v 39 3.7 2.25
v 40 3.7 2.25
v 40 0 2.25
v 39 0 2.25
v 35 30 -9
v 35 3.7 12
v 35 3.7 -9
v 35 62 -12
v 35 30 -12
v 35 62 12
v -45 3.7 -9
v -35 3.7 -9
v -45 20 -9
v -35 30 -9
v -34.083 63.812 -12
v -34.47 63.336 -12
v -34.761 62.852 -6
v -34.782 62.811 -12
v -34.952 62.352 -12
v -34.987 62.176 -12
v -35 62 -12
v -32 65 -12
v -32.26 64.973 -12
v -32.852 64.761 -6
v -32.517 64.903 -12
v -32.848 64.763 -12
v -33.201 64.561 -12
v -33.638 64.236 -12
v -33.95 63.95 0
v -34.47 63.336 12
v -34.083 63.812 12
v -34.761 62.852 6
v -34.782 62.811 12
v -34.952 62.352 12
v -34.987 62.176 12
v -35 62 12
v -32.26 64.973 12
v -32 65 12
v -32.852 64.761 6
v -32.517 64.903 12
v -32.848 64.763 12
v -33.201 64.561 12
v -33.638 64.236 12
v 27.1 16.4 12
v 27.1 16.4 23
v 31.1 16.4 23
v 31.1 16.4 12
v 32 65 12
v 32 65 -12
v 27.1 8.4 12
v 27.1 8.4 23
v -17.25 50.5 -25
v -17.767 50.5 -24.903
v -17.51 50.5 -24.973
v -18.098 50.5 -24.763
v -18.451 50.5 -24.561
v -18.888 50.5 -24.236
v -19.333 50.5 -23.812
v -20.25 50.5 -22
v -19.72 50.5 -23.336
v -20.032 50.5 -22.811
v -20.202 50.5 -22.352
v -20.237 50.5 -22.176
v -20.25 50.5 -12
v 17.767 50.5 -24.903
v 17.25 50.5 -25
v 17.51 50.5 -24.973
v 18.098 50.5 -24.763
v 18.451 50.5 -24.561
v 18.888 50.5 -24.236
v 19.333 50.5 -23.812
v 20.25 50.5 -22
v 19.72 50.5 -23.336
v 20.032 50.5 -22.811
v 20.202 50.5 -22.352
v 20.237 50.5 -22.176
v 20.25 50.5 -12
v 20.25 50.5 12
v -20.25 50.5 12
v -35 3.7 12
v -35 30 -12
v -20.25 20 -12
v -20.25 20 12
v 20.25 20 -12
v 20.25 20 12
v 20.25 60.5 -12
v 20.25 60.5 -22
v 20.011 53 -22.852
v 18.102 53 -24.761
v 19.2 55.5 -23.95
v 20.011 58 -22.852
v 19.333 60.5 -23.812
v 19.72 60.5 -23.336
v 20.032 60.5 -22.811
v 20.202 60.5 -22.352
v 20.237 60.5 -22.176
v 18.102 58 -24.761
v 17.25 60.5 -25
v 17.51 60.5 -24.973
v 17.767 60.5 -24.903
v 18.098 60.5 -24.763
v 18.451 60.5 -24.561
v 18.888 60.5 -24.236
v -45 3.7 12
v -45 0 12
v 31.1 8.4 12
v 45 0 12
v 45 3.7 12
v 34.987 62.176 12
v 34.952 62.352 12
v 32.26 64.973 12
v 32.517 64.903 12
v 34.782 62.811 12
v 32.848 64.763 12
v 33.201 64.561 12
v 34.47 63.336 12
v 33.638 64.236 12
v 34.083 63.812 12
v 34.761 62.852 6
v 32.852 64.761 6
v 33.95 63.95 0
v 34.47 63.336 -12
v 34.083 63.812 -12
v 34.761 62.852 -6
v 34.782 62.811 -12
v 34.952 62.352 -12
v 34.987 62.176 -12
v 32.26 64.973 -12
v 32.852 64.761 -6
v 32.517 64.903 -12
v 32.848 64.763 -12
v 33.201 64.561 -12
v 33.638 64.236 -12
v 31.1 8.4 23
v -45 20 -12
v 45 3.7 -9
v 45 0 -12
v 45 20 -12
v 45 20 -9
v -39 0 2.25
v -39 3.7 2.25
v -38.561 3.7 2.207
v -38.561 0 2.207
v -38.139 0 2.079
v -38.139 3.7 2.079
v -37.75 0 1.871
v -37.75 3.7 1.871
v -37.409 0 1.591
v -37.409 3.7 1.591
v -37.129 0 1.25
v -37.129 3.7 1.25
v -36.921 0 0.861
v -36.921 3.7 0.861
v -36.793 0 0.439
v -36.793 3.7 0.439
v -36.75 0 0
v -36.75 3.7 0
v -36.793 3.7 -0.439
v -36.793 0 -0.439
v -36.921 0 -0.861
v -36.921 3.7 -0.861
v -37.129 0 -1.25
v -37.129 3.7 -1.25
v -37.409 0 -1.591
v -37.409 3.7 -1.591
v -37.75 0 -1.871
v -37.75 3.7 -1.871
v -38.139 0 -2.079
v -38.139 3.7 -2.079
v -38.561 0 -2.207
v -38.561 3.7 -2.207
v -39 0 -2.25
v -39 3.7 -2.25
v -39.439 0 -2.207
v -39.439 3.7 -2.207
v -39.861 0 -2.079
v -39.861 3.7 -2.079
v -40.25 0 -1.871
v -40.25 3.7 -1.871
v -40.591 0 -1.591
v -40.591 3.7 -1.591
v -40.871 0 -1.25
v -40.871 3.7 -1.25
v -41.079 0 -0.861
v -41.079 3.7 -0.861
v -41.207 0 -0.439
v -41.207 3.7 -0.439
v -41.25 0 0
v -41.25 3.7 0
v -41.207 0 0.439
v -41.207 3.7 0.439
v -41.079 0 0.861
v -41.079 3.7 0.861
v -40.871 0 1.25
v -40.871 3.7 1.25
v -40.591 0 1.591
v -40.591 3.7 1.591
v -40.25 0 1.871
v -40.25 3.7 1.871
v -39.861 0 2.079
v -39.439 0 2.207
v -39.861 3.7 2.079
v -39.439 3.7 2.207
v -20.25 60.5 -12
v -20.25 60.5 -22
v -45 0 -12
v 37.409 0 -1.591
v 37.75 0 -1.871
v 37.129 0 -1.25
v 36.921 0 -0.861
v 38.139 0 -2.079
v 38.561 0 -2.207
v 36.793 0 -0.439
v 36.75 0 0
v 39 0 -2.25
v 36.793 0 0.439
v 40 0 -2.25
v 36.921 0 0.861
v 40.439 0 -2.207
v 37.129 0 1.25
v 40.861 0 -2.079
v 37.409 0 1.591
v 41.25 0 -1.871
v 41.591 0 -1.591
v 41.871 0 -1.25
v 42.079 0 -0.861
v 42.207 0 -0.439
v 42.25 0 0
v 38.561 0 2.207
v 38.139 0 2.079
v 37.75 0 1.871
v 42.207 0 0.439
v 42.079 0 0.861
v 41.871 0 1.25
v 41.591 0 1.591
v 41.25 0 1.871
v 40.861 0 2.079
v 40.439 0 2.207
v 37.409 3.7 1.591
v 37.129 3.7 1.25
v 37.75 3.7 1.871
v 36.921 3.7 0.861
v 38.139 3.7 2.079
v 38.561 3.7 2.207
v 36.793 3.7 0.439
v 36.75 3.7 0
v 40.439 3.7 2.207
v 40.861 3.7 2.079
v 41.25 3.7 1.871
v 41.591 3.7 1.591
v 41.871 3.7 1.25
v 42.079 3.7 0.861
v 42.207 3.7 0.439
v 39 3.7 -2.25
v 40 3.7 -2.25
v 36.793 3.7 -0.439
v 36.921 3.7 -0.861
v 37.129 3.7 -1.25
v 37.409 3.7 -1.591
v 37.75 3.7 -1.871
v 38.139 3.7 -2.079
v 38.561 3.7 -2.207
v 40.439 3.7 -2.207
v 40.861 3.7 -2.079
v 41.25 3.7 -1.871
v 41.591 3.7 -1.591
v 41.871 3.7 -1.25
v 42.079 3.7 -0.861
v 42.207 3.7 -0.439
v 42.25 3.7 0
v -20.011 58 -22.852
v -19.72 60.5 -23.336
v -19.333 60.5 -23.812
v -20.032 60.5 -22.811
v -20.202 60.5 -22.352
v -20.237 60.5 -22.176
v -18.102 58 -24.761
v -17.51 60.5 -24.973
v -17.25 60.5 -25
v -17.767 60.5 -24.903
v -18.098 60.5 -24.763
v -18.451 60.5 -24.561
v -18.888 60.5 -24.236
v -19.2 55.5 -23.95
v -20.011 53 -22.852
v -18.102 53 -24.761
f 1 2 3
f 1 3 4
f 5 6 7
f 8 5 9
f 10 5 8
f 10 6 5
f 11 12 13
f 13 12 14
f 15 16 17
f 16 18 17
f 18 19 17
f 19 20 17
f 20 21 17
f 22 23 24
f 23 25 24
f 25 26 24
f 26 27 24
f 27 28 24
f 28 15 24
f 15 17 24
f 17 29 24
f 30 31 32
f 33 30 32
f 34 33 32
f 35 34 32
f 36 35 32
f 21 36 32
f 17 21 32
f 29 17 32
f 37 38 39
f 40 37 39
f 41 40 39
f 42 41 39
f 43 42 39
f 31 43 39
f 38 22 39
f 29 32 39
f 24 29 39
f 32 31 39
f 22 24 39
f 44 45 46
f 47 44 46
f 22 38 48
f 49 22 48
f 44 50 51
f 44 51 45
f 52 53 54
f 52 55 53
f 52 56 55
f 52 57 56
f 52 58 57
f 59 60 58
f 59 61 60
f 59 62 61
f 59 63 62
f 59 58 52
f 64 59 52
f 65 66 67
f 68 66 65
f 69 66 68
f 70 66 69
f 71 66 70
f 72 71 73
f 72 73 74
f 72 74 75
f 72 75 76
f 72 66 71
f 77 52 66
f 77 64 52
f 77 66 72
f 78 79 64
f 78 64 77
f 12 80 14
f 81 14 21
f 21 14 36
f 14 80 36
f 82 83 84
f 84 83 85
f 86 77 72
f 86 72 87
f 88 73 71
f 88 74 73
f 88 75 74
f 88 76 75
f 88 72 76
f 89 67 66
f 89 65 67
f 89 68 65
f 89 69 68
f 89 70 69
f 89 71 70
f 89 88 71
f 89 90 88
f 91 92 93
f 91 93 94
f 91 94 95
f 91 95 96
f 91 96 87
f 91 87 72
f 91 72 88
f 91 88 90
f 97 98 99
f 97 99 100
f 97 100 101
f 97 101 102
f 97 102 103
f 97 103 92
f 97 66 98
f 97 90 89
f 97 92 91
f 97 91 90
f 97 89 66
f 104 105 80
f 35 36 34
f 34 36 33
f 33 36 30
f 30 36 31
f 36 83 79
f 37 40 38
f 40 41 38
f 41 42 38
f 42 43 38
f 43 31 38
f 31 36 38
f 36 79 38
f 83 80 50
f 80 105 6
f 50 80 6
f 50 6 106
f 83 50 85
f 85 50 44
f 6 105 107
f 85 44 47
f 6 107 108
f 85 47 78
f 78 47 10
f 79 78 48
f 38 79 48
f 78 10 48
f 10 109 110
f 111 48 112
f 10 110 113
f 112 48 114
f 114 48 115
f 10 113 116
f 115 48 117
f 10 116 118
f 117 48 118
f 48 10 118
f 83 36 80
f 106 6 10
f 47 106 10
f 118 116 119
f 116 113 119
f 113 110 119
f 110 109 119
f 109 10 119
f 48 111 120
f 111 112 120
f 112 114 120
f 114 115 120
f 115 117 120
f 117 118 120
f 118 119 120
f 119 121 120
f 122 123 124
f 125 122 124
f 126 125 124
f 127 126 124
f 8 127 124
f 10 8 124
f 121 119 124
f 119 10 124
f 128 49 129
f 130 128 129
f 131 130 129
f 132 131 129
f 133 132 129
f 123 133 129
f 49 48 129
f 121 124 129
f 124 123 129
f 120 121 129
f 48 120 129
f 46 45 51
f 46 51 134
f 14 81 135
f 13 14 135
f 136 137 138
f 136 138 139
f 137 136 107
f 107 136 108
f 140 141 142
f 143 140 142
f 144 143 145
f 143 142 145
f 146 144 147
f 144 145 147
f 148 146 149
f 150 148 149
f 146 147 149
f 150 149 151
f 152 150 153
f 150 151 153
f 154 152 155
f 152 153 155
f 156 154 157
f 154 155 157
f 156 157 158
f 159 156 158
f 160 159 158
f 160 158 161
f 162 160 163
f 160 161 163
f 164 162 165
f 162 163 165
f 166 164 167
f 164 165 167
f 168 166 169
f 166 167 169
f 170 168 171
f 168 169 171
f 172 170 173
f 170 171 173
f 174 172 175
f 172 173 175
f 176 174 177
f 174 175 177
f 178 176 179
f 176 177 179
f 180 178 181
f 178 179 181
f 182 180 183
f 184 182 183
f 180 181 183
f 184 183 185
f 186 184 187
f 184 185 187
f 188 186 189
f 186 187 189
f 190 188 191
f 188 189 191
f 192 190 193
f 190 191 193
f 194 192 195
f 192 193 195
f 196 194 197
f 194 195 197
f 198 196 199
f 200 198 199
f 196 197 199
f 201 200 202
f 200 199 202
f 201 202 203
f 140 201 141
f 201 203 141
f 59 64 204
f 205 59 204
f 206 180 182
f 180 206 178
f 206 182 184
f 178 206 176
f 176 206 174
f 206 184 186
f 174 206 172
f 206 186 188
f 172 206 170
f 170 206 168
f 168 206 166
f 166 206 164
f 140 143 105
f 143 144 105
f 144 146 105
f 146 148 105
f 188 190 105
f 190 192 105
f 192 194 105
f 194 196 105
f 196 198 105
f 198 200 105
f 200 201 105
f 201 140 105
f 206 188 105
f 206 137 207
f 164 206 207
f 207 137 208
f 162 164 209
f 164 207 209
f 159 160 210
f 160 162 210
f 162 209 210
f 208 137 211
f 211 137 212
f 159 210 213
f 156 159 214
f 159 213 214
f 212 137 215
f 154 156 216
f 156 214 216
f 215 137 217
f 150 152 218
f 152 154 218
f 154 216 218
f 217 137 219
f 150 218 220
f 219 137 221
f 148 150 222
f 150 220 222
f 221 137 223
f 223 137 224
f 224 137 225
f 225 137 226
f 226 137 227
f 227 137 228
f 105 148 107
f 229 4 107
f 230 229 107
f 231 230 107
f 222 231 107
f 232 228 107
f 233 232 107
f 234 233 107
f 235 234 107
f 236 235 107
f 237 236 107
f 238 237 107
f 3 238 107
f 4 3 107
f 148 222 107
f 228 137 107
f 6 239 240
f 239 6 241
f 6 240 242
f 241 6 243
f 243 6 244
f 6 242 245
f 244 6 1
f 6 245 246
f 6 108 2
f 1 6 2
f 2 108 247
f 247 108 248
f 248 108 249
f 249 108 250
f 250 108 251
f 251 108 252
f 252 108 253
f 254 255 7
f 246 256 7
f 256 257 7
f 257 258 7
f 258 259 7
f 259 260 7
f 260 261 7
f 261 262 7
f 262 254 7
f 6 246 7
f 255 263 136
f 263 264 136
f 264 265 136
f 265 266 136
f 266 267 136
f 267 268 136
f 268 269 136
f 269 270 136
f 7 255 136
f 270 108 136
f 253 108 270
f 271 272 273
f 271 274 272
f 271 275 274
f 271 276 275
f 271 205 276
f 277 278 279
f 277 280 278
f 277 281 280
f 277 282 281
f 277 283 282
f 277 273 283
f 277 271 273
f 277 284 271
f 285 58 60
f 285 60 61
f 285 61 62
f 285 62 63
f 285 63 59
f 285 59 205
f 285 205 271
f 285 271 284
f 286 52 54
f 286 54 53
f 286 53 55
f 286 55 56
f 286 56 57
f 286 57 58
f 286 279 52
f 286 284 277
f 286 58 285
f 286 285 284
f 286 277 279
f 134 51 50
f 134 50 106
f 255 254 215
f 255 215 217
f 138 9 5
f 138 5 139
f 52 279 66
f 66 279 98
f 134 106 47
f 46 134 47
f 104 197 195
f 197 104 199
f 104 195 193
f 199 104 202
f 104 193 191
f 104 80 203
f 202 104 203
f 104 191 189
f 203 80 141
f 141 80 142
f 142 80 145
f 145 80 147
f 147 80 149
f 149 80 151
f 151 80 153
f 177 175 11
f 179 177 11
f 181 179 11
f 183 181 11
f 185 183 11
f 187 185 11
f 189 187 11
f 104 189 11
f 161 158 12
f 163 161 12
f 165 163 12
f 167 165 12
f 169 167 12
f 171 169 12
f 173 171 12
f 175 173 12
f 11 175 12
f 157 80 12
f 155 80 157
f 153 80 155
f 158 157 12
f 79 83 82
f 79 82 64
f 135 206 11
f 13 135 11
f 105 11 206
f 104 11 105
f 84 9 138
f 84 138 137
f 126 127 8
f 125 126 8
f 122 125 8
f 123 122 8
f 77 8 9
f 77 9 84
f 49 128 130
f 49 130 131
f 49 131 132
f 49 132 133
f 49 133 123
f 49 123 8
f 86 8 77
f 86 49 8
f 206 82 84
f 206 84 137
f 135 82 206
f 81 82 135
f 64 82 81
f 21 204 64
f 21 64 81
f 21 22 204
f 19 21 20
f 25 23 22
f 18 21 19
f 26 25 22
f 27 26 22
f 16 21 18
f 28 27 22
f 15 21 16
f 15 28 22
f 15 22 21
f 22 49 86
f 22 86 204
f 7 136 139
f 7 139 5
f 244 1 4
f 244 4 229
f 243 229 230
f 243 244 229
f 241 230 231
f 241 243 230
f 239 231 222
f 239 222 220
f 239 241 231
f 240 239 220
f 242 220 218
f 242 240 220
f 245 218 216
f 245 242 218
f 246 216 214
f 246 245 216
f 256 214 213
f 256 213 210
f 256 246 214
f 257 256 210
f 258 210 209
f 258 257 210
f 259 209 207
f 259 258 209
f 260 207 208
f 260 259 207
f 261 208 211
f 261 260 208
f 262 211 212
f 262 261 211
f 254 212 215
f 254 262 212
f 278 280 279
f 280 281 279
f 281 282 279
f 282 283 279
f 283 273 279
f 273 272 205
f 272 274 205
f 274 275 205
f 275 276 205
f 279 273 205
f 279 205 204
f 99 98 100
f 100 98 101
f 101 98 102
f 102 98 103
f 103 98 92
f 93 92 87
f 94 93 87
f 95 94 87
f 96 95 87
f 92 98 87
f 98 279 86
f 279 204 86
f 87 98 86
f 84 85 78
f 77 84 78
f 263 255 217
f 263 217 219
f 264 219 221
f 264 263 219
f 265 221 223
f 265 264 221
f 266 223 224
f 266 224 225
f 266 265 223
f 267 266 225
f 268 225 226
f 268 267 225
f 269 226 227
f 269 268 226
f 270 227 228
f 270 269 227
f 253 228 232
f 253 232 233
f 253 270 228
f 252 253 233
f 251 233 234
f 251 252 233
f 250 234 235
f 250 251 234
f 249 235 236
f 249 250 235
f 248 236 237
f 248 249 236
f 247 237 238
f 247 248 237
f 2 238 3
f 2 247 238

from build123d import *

# Parameters (mm, degrees)
SKETCH1_W           = 70
SKETCH1_H           = 65
BOSS_EXTRUDE1_DEPTH = 12
BOSS_EXTRUDE2_START = 10
BOSS_EXTRUDE2_DEPTH = 90
BOSS_EXTRUDE3_DEPTH = 3
SKETCH4_W           = 40.5
SKETCH4_H           = 10
BOSS_EXTRUDE4_DEPTH = 13
SKETCH5_W           = 40.5
SKETCH5_H           = 30.5
CUT_EXTRUDE1_DEPTH  = 24
SKETCH6_W           = 4
SKETCH6_H           = 8
BOSS_EXTRUDE5_DEPTH = 11
FILLET1_SIZE        = 3
SKETCH7_R           = 2.25
CUT_EXTRUDE2_DEPTH  = 3.7


with BuildPart() as part:
    # Sketch1 → Boss-Extrude1 (new, symmetric)
    with BuildSketch(Plane.XY):
        with Locations((0, 32.5)):
            Rectangle(SKETCH1_W, SKETCH1_H)
    extrude(amount=BOSS_EXTRUDE1_DEPTH, both=True)

    # Sketch2 → Boss-Extrude2 (add)
    with BuildSketch(Plane(origin=(35, 0, 0), x_dir=(0, 0, -1), z_dir=(1, 0, 0)).offset(BOSS_EXTRUDE2_START)):
        Polygon((12, 20), (12, 0), (-12, 0), (-12, 3.7), (9, 3.7), (9, 20), align=None)
    extrude(amount=-BOSS_EXTRUDE2_DEPTH)

    # Sketch3 → Boss-Extrude3 (add)
    with BuildSketch(Plane(origin=(0, 0, -12), x_dir=(-1, 0, 0), z_dir=(0, 0, -1))):
        Polygon((-45, 20), (-35, 20), (-35, 30), align=None)
        Polygon((35, 30), (45, 20), (35, 20), align=None)
    extrude(amount=-BOSS_EXTRUDE3_DEPTH)

    # Sketch4 → Boss-Extrude4 (add)
    with BuildSketch(Plane.XY.offset(-12)):
        with Locations((0, 55.5)):
            Rectangle(SKETCH4_W, SKETCH4_H)
    extrude(amount=-BOSS_EXTRUDE4_DEPTH)

    # Sketch5 → Cut-Extrude1 (cut)
    with BuildSketch(Plane.XY.offset(12)):
        with Locations((0, 35.25)):
            Rectangle(SKETCH5_W, SKETCH5_H)
    extrude(amount=-CUT_EXTRUDE1_DEPTH, mode=Mode.SUBTRACT)

    # Sketch6 → Boss-Extrude5 (add)
    with BuildSketch(Plane.XY.offset(12)):
        with Locations((29.1, 12.4)):
            Rectangle(SKETCH6_W, SKETCH6_H)
    extrude(amount=BOSS_EXTRUDE5_DEPTH)

    # Fillet1
    # a fillet whose section is not a circle: 3 mm, written as the material it takes off along each edge
    with BuildSketch(Plane(origin=(-35, 65, 19.5), x_dir=(0, -1, 0), z_dir=(0, 0, -1)), Plane(origin=(35, 65, -19.5), x_dir=(0, -1, 0), z_dir=(0, 0, 1))) as fillet1_piece_1:
        with BuildLine():
            Bezier((FILLET1_SIZE, 0), (0, 0), (0, -FILLET1_SIZE), weights=[1, 0.428571429, 1])
            Line((0, -FILLET1_SIZE), (0, 0))
            Line((0, 0), (FILLET1_SIZE, 0))
        make_face()
    extrude(amount=39, mode=Mode.SUBTRACT)
    with BuildSketch(Plane(origin=(-20.25, 43, -25), x_dir=(0, 0, 1), z_dir=(0, 1, 0)), Plane(origin=(20.25, 68, -25), x_dir=(0, 0, 1), z_dir=(0, -1, 0))) as fillet1_piece_2:
        with BuildLine():
            Bezier((FILLET1_SIZE, 0), (0, 0), (0, FILLET1_SIZE), weights=[1, 0.428571429, 1])
            Line((0, FILLET1_SIZE), (0, 0))
            Line((0, 0), (FILLET1_SIZE, 0))
        make_face()
    extrude(amount=25, mode=Mode.SUBTRACT)

    # Sketch7 → Cut-Extrude2 (cut)
    with BuildSketch(Plane(origin=(0, 3.7, 0), x_dir=(1, 0, 0), z_dir=(0, 1, 0))):
        with Locations(Location((-39, 0, 0), (0, 0, 270))):
            Circle(SKETCH7_R)
        with BuildLine():
            Line((39, 2.25), (40, 2.25))
            ThreePointArc((40, 2.25), (42.25, 0), (40, -2.25))
            Line((40, -2.25), (39, -2.25))
            ThreePointArc((39, -2.25), (36.75, 0), (39, 2.25))
        make_face()
    extrude(amount=-CUT_EXTRUDE2_DEPTH, mode=Mode.SUBTRACT)


solid = part.part
